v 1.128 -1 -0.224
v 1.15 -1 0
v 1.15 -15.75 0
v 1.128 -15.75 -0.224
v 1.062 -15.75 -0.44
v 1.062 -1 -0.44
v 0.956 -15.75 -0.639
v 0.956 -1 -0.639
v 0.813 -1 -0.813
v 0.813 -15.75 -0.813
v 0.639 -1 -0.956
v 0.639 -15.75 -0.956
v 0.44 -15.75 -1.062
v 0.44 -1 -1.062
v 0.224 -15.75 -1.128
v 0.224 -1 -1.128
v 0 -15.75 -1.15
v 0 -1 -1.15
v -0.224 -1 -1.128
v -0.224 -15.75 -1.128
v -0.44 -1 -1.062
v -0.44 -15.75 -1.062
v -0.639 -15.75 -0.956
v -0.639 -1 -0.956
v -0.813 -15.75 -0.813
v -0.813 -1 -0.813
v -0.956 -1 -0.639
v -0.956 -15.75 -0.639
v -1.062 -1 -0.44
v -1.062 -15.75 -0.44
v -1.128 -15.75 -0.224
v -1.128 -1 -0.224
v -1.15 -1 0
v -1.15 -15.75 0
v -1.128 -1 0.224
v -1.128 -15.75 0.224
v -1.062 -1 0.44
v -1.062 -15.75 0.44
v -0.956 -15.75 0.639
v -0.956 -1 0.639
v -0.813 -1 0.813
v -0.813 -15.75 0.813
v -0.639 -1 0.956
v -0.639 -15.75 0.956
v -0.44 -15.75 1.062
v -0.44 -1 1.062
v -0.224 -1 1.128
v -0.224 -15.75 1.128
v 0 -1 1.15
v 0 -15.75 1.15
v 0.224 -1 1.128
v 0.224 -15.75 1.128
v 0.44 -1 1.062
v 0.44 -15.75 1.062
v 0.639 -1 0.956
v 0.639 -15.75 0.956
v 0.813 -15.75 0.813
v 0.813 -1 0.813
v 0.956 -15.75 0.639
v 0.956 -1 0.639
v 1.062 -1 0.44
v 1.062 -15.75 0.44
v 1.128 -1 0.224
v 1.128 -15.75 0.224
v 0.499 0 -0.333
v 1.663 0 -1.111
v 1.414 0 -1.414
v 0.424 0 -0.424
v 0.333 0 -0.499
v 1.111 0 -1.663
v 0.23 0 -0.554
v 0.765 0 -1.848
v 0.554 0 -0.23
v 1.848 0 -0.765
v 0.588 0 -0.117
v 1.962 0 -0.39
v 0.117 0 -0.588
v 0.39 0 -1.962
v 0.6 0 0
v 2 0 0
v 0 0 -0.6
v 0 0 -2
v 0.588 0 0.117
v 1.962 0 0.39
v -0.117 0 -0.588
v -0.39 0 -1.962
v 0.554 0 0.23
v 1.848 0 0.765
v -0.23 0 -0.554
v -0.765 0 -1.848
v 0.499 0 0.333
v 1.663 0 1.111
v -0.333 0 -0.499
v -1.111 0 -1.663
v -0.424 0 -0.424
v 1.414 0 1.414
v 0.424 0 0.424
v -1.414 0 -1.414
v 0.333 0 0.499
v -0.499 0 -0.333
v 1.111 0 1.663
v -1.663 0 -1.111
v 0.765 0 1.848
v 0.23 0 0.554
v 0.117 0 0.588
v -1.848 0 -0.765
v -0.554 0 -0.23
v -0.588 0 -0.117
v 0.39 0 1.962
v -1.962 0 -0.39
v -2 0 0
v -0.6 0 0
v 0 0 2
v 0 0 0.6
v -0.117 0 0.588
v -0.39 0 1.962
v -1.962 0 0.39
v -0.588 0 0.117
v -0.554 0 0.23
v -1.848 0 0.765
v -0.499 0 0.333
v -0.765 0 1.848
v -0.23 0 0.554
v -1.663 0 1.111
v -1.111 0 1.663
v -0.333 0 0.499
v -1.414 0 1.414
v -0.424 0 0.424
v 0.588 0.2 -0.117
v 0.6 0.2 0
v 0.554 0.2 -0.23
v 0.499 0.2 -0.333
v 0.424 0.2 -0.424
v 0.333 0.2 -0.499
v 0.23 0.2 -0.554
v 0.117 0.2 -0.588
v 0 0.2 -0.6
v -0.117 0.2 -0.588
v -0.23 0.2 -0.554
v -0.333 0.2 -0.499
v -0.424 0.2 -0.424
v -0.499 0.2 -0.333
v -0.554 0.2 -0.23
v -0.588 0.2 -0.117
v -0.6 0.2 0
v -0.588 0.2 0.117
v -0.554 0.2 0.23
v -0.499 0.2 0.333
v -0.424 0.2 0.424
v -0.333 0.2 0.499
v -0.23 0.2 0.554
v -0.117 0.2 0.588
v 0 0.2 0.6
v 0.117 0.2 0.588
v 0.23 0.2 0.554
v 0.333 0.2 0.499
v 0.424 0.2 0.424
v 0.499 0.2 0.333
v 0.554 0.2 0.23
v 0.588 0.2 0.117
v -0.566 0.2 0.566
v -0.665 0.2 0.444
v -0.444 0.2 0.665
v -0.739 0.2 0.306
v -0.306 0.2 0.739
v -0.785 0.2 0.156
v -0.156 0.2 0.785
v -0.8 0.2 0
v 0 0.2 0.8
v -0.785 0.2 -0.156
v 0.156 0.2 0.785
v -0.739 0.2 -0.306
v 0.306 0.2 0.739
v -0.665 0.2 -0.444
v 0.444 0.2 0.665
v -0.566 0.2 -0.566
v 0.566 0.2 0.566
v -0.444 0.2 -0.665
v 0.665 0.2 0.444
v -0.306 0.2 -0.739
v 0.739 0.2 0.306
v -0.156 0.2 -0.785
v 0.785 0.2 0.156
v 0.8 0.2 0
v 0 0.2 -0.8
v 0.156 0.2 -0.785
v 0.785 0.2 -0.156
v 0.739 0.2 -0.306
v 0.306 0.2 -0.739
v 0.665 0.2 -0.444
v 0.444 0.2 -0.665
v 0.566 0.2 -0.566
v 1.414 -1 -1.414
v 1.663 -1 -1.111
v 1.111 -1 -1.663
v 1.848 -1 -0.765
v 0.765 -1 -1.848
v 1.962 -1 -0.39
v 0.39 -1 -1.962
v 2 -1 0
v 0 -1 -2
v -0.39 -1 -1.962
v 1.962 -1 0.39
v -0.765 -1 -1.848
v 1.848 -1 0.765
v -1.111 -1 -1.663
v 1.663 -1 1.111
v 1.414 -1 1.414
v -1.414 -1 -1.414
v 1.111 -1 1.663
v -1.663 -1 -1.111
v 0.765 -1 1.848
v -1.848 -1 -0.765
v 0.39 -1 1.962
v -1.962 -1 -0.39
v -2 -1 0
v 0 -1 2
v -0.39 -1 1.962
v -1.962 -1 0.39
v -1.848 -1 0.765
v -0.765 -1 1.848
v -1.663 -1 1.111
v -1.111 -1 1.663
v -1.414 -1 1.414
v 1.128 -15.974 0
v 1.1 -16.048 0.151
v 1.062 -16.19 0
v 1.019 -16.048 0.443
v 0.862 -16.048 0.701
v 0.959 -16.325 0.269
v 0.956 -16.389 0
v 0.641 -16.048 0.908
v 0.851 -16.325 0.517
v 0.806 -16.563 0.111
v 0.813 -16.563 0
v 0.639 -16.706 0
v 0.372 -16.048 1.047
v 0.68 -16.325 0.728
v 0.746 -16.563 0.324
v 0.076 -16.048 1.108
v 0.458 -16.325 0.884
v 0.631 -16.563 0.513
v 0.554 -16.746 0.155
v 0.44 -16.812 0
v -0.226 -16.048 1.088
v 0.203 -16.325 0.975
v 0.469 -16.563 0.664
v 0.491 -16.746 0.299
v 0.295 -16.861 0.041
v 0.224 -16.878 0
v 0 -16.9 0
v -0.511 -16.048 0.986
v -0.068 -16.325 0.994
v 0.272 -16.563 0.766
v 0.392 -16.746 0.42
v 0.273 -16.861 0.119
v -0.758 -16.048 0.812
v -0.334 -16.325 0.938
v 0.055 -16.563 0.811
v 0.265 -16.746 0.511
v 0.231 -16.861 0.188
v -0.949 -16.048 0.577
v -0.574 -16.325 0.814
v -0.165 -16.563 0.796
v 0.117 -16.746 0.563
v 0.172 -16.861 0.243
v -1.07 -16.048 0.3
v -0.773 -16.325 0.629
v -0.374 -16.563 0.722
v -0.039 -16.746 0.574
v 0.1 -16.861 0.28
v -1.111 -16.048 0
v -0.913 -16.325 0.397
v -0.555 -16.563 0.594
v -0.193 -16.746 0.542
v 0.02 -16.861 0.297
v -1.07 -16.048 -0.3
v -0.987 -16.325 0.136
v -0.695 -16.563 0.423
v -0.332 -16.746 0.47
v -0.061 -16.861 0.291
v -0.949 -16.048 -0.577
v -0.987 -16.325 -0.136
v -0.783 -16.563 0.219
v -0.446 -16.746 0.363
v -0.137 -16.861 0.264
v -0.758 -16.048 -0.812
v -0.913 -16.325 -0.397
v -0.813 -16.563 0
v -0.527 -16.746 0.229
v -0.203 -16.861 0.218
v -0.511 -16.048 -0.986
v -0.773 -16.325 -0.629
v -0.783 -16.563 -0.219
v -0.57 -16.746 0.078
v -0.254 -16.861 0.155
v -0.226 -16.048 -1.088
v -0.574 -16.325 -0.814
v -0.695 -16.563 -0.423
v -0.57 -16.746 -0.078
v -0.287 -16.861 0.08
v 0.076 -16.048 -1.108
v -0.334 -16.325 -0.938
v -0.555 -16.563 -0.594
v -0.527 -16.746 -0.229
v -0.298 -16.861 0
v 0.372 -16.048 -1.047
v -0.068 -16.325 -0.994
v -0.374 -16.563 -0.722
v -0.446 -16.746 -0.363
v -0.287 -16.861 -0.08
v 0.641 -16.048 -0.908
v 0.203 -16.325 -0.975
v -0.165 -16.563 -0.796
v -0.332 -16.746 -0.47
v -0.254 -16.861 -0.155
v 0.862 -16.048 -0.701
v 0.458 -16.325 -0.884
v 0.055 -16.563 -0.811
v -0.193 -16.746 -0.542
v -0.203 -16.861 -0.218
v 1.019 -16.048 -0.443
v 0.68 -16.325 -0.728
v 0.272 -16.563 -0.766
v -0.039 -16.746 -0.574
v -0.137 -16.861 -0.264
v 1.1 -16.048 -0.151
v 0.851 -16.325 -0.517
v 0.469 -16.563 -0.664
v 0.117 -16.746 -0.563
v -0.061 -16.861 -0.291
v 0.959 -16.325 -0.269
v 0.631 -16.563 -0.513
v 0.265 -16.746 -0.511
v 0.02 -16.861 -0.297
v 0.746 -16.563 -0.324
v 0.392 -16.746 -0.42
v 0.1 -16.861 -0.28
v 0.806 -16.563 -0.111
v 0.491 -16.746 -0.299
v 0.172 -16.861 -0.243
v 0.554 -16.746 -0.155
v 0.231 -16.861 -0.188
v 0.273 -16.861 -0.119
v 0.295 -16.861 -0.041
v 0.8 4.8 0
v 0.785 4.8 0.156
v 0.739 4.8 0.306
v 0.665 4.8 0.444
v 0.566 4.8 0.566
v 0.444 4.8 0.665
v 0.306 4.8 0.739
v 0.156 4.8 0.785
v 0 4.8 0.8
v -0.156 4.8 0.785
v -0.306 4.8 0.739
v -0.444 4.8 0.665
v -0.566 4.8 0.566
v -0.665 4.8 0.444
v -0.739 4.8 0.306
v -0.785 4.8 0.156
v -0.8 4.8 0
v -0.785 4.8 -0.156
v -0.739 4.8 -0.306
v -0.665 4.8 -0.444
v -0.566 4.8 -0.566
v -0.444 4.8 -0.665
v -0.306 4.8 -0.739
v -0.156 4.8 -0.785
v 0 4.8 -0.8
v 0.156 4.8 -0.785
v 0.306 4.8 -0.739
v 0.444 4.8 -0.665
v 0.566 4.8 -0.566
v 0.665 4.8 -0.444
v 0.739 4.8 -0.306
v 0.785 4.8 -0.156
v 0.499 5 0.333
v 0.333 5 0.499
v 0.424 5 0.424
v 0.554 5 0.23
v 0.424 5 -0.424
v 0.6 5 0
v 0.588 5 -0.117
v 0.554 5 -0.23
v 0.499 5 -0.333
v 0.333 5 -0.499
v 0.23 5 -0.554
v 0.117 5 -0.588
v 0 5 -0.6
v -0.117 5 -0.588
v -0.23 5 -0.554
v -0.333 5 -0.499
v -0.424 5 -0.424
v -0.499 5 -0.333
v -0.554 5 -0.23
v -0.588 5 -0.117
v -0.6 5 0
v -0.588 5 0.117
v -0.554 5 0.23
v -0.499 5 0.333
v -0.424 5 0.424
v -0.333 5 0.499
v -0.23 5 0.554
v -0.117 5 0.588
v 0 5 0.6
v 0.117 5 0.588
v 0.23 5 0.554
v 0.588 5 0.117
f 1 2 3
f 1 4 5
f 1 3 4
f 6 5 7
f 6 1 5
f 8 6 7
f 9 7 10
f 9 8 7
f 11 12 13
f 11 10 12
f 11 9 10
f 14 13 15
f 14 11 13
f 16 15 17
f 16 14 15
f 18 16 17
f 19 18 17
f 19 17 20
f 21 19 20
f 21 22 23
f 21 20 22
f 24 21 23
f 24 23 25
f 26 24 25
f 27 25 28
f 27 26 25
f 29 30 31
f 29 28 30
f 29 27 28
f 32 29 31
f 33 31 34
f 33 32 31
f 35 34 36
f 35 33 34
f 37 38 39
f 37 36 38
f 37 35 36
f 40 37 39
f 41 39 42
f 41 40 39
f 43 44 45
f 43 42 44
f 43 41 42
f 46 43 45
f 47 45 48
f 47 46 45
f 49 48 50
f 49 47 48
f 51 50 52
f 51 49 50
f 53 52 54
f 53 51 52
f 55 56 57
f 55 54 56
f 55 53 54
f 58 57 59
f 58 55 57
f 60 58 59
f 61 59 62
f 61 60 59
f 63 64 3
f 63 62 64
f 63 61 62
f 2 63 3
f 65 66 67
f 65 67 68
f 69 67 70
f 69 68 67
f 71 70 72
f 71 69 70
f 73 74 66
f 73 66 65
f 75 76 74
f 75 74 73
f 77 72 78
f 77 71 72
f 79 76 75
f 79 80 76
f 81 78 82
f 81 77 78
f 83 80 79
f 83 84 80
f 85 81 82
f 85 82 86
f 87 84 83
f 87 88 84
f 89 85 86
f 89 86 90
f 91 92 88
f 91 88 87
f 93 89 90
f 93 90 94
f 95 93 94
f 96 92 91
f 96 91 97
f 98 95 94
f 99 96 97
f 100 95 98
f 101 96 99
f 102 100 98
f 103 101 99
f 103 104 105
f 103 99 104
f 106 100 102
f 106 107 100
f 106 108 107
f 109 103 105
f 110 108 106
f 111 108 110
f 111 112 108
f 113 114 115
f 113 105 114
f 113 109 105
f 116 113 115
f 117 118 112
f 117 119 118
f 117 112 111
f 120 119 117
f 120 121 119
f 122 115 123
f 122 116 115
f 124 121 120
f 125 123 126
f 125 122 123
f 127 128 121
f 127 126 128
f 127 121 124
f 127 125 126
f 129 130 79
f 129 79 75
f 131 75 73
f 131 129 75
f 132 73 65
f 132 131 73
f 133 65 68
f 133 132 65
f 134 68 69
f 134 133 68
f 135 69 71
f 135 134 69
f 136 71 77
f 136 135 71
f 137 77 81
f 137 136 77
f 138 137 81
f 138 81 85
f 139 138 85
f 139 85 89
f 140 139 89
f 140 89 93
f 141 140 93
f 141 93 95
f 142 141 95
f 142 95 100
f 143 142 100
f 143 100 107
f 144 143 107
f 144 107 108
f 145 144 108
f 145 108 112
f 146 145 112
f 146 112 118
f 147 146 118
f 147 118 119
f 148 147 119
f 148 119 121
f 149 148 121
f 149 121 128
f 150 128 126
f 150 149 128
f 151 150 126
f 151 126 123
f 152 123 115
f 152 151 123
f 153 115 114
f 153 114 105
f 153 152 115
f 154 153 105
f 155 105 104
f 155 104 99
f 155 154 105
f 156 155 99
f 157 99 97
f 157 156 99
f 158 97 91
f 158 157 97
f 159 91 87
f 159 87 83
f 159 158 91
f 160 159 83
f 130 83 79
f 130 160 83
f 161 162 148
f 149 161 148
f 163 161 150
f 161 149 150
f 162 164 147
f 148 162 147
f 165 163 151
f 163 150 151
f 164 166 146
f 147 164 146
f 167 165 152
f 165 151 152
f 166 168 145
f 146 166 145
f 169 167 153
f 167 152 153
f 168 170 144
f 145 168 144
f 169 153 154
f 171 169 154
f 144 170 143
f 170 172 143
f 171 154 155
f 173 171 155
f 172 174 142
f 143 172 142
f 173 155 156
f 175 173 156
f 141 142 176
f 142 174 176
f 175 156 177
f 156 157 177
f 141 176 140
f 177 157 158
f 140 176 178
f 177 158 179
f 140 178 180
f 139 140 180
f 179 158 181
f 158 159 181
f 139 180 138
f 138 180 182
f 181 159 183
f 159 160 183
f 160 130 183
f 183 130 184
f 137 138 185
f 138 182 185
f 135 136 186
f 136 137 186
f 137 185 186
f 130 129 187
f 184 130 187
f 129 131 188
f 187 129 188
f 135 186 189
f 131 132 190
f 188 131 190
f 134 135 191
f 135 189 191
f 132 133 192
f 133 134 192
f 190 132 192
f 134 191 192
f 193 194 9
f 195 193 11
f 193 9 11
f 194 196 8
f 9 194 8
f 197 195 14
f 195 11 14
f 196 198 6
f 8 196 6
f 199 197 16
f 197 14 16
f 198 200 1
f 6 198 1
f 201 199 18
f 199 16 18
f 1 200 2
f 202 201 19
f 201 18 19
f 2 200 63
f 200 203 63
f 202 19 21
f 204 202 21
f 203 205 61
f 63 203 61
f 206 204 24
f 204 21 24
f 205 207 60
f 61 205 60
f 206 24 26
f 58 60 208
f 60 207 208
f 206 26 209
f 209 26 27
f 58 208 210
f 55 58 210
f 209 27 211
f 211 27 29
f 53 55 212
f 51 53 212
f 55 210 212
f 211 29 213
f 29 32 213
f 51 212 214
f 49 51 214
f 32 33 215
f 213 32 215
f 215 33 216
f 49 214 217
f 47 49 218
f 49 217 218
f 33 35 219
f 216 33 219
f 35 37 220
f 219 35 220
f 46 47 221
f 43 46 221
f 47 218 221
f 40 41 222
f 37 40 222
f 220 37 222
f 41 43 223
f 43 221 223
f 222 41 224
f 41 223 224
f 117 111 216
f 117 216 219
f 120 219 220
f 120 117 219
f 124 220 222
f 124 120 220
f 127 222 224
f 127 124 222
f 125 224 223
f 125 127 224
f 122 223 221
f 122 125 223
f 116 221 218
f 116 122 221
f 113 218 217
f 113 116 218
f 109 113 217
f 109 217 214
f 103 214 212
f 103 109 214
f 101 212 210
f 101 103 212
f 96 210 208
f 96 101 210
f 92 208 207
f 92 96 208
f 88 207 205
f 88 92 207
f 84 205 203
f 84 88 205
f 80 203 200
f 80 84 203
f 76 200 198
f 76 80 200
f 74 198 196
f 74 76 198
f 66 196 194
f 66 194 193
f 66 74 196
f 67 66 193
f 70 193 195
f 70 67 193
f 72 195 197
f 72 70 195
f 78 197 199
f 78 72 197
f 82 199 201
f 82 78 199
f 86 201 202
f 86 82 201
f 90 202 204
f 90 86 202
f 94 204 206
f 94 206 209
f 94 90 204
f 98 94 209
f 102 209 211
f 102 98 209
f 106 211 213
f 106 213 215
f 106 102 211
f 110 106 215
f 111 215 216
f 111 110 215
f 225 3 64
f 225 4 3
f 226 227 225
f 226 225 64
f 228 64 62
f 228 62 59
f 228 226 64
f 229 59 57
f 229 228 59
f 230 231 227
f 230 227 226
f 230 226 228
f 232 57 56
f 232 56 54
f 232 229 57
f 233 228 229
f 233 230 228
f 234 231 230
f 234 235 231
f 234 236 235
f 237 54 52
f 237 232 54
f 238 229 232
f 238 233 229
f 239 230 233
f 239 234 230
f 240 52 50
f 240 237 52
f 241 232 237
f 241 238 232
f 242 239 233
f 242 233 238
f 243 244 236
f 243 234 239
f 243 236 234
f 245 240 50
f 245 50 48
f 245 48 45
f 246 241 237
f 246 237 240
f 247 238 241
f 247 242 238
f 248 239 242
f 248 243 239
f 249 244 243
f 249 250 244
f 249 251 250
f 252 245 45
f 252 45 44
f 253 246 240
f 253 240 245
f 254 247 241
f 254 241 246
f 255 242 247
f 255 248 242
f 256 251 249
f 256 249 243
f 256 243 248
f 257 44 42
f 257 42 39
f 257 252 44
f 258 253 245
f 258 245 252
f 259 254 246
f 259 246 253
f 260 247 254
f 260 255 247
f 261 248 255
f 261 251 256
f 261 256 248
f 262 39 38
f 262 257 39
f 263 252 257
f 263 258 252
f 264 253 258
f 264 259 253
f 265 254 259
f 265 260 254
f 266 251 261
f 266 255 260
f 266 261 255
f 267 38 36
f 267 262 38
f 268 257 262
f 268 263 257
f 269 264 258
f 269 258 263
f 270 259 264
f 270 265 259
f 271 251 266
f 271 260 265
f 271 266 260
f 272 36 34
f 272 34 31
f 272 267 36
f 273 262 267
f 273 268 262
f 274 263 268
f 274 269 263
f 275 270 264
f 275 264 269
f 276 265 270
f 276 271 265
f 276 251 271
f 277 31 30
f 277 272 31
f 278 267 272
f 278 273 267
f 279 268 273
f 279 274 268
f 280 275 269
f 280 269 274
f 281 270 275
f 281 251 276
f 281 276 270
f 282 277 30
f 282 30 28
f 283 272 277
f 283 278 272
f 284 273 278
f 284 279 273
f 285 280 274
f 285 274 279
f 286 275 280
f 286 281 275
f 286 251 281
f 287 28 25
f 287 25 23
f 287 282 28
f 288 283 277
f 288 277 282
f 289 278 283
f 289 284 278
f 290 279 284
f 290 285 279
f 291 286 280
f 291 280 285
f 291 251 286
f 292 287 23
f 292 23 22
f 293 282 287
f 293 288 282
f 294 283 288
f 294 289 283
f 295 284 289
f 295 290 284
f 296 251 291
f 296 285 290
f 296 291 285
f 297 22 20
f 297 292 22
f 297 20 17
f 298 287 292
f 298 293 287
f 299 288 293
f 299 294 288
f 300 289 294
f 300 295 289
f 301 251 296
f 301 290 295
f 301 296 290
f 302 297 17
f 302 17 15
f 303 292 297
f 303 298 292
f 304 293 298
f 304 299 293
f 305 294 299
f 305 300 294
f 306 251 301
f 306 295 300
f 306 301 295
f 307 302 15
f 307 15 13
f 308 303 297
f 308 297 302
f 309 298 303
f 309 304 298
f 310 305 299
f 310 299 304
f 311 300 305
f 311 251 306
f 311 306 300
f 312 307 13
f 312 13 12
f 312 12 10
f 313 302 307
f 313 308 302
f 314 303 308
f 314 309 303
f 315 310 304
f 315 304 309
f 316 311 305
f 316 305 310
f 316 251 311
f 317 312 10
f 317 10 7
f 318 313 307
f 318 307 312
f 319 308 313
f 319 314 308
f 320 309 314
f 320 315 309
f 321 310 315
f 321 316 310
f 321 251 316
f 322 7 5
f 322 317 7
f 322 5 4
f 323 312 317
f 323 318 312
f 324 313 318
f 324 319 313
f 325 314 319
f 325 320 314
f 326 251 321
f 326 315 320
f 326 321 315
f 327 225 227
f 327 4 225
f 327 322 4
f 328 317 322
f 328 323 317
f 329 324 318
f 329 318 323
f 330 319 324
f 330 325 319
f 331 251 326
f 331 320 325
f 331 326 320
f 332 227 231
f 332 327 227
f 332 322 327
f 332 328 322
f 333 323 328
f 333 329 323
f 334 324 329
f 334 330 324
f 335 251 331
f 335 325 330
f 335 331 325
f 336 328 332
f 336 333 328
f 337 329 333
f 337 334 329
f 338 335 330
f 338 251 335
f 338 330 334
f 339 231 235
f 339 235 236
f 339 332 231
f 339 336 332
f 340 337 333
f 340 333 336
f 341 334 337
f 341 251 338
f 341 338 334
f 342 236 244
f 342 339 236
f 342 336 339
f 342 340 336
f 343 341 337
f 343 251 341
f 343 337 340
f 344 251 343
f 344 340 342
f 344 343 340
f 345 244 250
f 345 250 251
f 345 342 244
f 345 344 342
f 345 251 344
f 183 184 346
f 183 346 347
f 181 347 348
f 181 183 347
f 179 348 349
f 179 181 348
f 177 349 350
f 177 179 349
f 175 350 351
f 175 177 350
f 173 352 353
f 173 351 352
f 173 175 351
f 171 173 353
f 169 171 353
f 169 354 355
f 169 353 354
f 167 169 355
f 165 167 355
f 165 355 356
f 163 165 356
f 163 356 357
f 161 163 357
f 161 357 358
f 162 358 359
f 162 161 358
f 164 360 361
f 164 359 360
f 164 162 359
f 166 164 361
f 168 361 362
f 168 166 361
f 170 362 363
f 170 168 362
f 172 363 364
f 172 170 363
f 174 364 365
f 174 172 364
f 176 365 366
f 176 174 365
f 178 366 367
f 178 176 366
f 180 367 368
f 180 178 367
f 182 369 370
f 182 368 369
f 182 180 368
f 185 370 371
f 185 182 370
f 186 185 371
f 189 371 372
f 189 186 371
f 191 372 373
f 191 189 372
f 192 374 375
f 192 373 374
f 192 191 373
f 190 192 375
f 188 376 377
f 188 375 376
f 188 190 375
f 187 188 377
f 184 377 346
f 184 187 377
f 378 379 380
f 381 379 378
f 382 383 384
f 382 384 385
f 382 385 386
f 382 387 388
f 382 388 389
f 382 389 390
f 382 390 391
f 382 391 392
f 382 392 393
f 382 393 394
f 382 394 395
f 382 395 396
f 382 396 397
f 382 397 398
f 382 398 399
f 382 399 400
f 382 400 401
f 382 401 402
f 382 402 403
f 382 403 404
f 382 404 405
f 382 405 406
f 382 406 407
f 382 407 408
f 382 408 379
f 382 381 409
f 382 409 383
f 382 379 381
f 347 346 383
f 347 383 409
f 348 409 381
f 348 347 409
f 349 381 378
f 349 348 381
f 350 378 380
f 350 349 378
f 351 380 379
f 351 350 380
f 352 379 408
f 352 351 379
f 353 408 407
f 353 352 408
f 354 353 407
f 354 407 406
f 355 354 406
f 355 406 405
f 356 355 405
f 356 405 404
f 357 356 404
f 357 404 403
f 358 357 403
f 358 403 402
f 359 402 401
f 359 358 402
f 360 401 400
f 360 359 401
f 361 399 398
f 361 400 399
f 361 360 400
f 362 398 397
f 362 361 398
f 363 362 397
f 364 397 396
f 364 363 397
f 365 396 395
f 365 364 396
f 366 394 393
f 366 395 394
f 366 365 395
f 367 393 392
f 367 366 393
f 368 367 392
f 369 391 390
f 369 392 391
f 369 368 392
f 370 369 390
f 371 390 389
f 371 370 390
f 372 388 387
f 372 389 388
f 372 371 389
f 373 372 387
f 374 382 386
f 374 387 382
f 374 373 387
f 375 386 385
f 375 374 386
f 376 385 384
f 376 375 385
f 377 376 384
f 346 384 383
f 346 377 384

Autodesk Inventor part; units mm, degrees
ref_plane "YZ Plane" through (0, 0, 0) normal (1, 0, 0) x (0, 1, 0)
ref_plane "XZ Plane" through (0, 0, 0) normal (0, 1, 0) x (-1, 0, 0)
ref_plane "XY Plane" through (0, 0, 0) normal (0, 0, 1) x (1, 0, 0)
sketch "Sketch1" plane through (0, 0, 0) normal (0, 1, 0) x (-1, 0, 0)
  circle A0 centre (0, 0) radius 2
  dimension "d0" = 4
extrude "Extrusion1" add sketch "Sketch1" against normal blind 1
sketch "Sketch2" plane through (0, 0, 0) normal (0, 1, 0) x (1, 0, 0)
  circle A0 centre (0, 0) radius 0.8
  dimension "d4" = 1.6
extrude "Extrusion2" add sketch "Sketch2" along normal blind 5
thread "Thread1" size "M1.6x0.35" class "6g" standard "ISO Metric profile" full length
sketch "Sketch3" plane through (0, -1, 0) normal (0, -1, 0) x (1, 0, 0)
  circle A0 centre (0, 0) radius 1.15
  dimension "d9" = 2.3
extrude "Extrusion3" add sketch "Sketch3" along normal blind 15.9
fillet "Fillet2" radius 1.15 1 edges at (-1.15, -16.9, 0)
sketch "Sketch4" plane through (0, 0, 0) normal (0, 0, 1) x (1, 0, 0)
  line L0 (-2, -1) -> (2, -1) projected
  line L1 (2, 0) -> (-2, 0) projected
  line L2 (0.8, 5) -> (-0.8, 5) projected
  line L3 (-0.8, 0) -> (0.8, 0) projected
  line L4 (0.8, 0) -> (0.6, 0)
  line L5 (0.6, 0) -> (0.6, 0.2)
  line L6 (0.6, 0.2) -> (0.8, 0.2)
  line L7 (0.8, 0.2) -> (0.8, 0)
  line L8 (0, -2.2) -> (0, 6.2) projected
  point P0 (0, 0)
  dimension "d13" = 0.2
  dimension "d14" = 0.2
revolve "Revolution1" cut sketch "Sketch4" angle 360 about axis through (0, -10, 0) along (0, 1, 0)
chamfer "Chamfer1" distance 0.2 angle 45 1 edges at (-0.8, 5, 0)
equation "\"d12\" = 0.5 * d9"
properties part number "KN-00-03-01" material "X105CrMo17"
